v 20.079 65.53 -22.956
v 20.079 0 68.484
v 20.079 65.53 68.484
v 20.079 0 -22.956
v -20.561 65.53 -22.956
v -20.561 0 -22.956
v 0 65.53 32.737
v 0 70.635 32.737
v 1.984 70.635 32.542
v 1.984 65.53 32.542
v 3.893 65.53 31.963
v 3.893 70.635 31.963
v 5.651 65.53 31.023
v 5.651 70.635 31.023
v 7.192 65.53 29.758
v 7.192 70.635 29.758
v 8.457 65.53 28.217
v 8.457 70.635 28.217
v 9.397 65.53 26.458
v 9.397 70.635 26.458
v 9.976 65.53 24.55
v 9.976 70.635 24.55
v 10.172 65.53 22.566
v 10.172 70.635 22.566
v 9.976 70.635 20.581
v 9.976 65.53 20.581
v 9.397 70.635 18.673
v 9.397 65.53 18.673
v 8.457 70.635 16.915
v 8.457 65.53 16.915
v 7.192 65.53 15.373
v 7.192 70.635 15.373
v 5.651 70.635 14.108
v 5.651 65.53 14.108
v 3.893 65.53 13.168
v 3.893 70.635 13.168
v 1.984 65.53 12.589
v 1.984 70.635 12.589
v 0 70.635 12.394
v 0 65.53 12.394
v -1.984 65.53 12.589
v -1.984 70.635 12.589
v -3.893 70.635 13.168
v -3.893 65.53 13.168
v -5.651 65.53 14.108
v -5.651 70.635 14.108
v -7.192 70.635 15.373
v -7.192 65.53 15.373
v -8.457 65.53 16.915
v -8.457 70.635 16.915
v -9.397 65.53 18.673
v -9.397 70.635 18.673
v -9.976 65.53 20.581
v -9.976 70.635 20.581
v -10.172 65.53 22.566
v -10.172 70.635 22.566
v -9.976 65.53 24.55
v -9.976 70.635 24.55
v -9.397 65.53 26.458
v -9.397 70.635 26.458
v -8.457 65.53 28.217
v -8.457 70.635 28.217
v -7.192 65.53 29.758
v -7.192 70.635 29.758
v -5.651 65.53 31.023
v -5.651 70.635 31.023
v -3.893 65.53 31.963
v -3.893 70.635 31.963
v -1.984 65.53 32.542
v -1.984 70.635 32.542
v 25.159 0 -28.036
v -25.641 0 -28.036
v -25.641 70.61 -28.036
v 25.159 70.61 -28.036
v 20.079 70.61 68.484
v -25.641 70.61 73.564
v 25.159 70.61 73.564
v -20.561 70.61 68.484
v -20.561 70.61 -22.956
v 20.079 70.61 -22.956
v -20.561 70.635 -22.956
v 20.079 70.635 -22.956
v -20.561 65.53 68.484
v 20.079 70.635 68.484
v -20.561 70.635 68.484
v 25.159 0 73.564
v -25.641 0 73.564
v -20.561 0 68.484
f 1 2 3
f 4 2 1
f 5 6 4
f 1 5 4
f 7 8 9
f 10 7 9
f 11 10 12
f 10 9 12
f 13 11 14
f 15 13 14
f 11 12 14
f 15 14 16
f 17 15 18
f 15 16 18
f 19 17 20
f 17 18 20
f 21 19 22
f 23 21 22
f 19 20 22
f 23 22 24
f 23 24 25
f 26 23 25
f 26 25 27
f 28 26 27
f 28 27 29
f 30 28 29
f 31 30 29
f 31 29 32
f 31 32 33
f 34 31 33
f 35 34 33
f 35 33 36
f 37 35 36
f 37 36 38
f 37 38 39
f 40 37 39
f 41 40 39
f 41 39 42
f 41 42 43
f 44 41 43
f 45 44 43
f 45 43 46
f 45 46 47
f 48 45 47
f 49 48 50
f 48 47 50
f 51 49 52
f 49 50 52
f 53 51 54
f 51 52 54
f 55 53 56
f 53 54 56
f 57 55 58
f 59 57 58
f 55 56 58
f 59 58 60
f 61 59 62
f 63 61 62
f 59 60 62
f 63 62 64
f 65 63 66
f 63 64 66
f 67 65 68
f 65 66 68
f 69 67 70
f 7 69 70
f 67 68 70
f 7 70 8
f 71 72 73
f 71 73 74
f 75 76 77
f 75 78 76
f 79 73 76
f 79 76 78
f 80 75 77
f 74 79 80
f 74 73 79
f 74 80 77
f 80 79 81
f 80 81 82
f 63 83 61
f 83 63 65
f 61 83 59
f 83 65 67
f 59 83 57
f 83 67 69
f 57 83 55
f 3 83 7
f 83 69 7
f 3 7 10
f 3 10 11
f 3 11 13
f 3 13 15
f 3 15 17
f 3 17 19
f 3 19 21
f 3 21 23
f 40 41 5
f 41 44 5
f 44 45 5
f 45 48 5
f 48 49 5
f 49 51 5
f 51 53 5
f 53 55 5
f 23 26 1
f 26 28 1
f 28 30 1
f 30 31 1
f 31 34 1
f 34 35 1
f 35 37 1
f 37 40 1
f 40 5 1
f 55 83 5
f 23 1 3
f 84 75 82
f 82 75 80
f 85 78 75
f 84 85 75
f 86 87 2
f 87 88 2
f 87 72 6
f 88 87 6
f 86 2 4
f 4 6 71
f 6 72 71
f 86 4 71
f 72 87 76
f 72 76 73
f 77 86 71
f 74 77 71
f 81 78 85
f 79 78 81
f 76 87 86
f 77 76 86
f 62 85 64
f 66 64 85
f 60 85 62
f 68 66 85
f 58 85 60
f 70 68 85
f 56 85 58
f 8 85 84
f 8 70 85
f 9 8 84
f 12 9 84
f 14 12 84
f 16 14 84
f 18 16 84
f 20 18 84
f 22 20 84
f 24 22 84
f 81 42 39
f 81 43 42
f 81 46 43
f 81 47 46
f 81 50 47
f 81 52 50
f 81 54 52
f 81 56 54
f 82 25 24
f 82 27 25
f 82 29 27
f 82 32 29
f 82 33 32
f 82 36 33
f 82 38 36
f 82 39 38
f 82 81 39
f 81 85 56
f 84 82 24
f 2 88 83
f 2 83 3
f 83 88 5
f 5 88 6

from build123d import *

# Parameters (mm, degrees)
SKETCH1_W                = 50.8
SKETCH1_H                = 101.6
SKETCH1_W_2              = 40.64
SKETCH1_H_2              = 91.44
BOSS_EXTRUDE1_DEPTH      = 70.61
BOSS_EXTRUDE2_DEPTH      = 0.0254
BOSS_EXTRUDE2_DEPTH_BACK = 5.08
SKETCH2_W                = 40.64
SKETCH2_H                = 91.44
SKETCH3_R                = 10.171709971
CUT_EXTRUDE1_DEPTH       = 106.159035776


with BuildPart() as part:
    # Sketch1 → Boss-Extrude1 (new body)
    with BuildSketch(Plane(origin=(0, 0, 0), x_dir=(1, 0, 0), z_dir=(0, 1, 0))):
        with Locations((-0.241139241, -22.763544304)):
            Rectangle(SKETCH1_W, SKETCH1_H)
        with Locations((-0.241139241, -22.763544304)):
            Rectangle(SKETCH1_W_2, SKETCH1_H_2, mode=Mode.SUBTRACT)
    extrude(amount=BOSS_EXTRUDE1_DEPTH)

    # Sketch2 → Boss-Extrude2 (add, two sides: drawn at the far end of the back side and taken through both)
    with BuildSketch(Plane(origin=(0, 70.61, 0), x_dir=(1, 0, 0), z_dir=(0, 1, 0)).offset(-BOSS_EXTRUDE2_DEPTH_BACK)):
        with Locations((-0.241139241, -22.763544304)):
            Rectangle(SKETCH2_W, SKETCH2_H)
    extrude(amount=BOSS_EXTRUDE2_DEPTH + BOSS_EXTRUDE2_DEPTH_BACK)

    # Sketch3 → Cut-Extrude1 (cut, through all)
    with BuildSketch(Plane(origin=(0, 70.6354, 0), x_dir=(1, 0, 0), z_dir=(0, 1, 0))):
        with Locations(Location((0, -22.565616606, 0), (0, 0, 270))):
            Circle(SKETCH3_R)
    extrude(amount=-CUT_EXTRUDE1_DEPTH, mode=Mode.SUBTRACT)


solid = part.part
